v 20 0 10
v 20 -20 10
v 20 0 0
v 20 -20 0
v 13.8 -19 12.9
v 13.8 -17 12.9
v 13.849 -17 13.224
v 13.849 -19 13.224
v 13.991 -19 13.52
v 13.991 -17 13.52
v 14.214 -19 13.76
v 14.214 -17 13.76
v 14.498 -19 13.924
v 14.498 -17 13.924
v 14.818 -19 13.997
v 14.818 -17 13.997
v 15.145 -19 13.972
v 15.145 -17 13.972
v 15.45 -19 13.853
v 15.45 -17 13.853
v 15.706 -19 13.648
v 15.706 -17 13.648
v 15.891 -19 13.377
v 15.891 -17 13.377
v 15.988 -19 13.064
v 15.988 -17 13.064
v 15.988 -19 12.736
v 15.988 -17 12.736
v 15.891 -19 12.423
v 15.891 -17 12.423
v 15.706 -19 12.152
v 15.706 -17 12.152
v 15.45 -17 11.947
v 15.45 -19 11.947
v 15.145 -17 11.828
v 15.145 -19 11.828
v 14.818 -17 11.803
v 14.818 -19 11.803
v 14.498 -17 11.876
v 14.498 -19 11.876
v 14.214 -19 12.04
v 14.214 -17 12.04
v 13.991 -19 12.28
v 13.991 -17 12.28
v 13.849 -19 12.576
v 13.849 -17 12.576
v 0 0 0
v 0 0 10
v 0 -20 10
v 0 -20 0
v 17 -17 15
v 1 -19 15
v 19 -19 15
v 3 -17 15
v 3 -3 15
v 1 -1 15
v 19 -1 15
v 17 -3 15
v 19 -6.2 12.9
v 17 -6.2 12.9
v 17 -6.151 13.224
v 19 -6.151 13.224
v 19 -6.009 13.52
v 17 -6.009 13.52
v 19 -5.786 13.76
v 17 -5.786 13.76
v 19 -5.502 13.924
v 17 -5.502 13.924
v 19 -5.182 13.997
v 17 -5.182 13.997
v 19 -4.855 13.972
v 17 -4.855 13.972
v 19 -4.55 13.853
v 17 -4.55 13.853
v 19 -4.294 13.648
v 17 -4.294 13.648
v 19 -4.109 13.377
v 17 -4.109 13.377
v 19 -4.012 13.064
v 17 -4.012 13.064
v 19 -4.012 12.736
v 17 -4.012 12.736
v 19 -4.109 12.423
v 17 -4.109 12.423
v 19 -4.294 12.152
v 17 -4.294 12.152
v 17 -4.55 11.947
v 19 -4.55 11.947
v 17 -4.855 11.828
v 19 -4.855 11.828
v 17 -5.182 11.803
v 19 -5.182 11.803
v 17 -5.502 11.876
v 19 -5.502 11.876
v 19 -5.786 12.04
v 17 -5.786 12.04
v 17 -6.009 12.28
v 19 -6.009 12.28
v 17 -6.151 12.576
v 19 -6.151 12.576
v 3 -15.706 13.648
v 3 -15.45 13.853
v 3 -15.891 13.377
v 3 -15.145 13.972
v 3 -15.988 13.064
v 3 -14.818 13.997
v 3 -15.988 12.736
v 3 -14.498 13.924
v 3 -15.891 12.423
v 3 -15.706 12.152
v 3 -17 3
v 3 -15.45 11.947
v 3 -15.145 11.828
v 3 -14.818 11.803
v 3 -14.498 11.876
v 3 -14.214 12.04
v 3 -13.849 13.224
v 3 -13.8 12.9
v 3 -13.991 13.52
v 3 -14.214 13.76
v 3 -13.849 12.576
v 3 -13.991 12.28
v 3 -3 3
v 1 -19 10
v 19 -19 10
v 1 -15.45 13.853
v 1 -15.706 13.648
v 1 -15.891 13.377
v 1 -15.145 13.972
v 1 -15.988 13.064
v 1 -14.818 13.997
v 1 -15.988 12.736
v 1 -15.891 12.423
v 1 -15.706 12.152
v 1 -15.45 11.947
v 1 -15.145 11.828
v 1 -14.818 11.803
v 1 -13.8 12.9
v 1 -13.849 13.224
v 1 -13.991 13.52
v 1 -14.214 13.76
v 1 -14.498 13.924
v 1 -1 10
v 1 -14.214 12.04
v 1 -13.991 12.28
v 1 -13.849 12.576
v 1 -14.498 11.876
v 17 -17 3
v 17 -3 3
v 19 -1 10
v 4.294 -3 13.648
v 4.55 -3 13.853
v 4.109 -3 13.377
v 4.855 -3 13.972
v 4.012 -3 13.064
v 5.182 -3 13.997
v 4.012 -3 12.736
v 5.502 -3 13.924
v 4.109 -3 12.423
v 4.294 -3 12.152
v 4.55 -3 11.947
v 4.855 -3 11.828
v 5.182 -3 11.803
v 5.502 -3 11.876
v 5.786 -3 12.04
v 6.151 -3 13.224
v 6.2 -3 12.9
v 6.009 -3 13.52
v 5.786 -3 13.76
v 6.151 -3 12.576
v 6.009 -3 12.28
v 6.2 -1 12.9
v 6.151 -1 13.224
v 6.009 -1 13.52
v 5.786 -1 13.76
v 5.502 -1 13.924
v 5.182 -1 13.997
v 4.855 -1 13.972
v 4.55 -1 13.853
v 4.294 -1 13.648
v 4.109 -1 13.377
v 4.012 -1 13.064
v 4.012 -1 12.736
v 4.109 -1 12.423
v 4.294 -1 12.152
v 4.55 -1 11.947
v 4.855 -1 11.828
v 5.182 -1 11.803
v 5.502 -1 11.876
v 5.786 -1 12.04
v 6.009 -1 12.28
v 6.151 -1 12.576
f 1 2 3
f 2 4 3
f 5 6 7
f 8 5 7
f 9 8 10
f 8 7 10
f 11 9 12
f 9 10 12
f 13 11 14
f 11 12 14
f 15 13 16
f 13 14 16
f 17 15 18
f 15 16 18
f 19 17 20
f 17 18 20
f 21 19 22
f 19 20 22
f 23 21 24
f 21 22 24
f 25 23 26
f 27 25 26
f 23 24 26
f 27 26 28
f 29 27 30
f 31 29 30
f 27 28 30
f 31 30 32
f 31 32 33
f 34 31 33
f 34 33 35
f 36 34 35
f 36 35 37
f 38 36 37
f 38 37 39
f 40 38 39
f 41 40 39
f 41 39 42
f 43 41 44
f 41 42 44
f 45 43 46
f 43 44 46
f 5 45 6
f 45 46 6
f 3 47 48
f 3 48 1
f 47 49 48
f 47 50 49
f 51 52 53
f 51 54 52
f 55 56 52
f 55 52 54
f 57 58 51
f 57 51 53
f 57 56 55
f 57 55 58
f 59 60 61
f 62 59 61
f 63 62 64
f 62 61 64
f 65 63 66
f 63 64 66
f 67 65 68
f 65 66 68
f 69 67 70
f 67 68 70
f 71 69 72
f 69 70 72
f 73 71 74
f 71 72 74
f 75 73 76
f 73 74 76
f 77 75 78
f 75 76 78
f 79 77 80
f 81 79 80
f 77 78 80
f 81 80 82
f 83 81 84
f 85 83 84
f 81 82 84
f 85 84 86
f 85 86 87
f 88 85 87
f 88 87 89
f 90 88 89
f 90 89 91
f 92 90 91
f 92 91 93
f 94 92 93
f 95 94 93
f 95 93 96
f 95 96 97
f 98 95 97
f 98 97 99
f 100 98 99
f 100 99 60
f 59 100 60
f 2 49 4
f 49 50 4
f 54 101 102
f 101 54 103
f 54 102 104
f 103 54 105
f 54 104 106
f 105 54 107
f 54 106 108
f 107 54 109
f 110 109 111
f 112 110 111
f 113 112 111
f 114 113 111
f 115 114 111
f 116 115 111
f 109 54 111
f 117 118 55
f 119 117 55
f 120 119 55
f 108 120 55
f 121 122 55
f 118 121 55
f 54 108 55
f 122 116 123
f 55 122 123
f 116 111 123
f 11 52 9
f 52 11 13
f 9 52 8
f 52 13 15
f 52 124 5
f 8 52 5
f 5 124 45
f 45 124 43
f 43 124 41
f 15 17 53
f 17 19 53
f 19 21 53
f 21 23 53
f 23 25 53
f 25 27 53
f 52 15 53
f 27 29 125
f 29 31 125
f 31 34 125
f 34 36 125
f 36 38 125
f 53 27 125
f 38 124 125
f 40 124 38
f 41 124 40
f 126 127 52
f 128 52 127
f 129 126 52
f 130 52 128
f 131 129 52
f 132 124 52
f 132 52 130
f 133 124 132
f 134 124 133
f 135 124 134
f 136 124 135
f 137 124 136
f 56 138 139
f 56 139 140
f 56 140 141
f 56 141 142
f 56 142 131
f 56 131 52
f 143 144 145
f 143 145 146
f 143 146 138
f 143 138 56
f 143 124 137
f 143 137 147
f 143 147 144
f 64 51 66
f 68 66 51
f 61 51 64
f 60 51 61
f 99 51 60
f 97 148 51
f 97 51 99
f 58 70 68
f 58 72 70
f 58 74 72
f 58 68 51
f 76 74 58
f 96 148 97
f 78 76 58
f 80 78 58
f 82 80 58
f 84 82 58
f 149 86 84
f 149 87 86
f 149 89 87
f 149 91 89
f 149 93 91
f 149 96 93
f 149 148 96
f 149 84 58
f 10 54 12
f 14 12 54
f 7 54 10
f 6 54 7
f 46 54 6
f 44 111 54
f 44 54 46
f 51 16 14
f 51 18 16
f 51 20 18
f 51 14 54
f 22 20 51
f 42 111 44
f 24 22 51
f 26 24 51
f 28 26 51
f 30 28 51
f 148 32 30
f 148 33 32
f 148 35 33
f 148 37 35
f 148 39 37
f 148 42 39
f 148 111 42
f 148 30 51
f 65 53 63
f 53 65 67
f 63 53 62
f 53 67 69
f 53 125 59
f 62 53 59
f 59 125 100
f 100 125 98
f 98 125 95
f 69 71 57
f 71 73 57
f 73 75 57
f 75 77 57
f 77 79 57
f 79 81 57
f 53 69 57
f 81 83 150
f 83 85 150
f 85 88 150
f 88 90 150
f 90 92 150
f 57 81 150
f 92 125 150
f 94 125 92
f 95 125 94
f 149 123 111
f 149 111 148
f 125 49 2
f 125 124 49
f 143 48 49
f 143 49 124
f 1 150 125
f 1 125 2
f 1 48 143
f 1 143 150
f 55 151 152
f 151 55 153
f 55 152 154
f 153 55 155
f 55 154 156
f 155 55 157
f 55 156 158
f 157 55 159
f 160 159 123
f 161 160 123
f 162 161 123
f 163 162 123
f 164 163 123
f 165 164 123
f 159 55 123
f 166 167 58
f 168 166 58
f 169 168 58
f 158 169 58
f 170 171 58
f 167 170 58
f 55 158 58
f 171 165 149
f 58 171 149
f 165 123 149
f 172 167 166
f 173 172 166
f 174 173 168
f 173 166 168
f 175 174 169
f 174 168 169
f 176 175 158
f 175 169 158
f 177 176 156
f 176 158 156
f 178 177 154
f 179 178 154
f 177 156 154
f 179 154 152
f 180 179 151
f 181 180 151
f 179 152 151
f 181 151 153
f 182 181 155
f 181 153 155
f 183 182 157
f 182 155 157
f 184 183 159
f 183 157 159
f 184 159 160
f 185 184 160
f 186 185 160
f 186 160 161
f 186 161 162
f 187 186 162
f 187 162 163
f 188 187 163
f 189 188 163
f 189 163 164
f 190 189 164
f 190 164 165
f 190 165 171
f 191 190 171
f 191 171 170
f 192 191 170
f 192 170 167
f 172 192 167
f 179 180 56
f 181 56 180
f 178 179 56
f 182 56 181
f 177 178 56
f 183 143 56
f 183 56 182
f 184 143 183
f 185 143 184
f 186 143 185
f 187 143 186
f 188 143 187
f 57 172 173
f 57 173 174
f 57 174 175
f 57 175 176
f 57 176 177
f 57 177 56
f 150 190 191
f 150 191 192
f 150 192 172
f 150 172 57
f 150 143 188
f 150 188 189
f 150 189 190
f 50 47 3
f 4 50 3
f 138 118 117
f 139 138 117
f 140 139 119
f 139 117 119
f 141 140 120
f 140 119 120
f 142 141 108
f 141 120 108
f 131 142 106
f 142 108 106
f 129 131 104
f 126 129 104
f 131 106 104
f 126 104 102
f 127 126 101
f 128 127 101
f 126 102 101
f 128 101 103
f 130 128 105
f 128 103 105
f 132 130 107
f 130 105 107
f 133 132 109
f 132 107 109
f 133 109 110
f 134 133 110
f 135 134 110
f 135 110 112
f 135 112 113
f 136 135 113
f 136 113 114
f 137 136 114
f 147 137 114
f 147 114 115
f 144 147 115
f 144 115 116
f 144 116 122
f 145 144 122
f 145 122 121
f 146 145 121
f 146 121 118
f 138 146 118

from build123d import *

# Parameters (mm, degrees)
F2_W      = 20
F2_H      = 20
F3_DEPTH  = 3
F4_W      = 20
F4_H      = 20
F4_W_2    = 14
F4_H_2    = 14
F5_DEPTH  = 7
F7_W      = 18
F7_H      = 18
F7_W_2    = 14
F7_H_2    = 14
F8_DEPTH  = 5
F9_R      = 1.1
F10_DEPTH = 2
F11_R     = 1.1
F12_DEPTH = 3
F13_R     = 1.1
F14_DEPTH = 3
F15_R     = 1.1
F16_DEPTH = 3


with BuildPart() as f3:
    # F2 (on Top) → F3 (new body)
    with BuildSketch(Plane.XY):
        with Locations((10, -10)):
            Rectangle(F2_W, F2_H)
    extrude(amount=F3_DEPTH)

    # F4 (on face) → F5 (join)
    with BuildSketch(Plane.XY.offset(3)):
        with Locations((10, -10)):
            Rectangle(F4_W, F4_H)
        with Locations((10, -10)):
            Rectangle(F4_W_2, F4_H_2, mode=Mode.SUBTRACT)
    extrude(amount=F5_DEPTH)

    # F7 (on face) → F8 (join)
    with BuildSketch(Plane.XY.offset(10)):
        with Locations((10, -10)):
            Rectangle(F7_W, F7_H)
        with Locations((10, -10)):
            Rectangle(F7_W_2, F7_H_2, mode=Mode.SUBTRACT)
    extrude(amount=F8_DEPTH)

    # F9 (on face) → F10 (cut)
    with BuildSketch(Plane(origin=(0, -17, 0), x_dir=(-1, 0, 0), z_dir=(0, 1, 0))):
        with Locations((-14.9, 12.9)):
            Circle(F9_R)
    extrude(amount=-F10_DEPTH, mode=Mode.SUBTRACT)

    # F11 (on face) → F12 (cut)
    with BuildSketch(Plane.YZ.offset(3)):
        with Locations((-14.9, 12.9)):
            Circle(F11_R)
    extrude(amount=-F12_DEPTH, mode=Mode.SUBTRACT)

    # F13 (on face) → F14 (cut)
    with BuildSketch(Plane.XZ.offset(3)):
        with Locations((5.1, 12.9)):
            Circle(F13_R)
    extrude(amount=-F14_DEPTH, mode=Mode.SUBTRACT)

    # F15 (on face) → F16 (cut)
    with BuildSketch(Plane(origin=(17, 0, 0), x_dir=(0, -1, 0), z_dir=(-1, 0, 0))):
        with Locations((5.1, 12.9)):
            Circle(F15_R)
    extrude(amount=-F16_DEPTH, mode=Mode.SUBTRACT)


solid = f3.part
